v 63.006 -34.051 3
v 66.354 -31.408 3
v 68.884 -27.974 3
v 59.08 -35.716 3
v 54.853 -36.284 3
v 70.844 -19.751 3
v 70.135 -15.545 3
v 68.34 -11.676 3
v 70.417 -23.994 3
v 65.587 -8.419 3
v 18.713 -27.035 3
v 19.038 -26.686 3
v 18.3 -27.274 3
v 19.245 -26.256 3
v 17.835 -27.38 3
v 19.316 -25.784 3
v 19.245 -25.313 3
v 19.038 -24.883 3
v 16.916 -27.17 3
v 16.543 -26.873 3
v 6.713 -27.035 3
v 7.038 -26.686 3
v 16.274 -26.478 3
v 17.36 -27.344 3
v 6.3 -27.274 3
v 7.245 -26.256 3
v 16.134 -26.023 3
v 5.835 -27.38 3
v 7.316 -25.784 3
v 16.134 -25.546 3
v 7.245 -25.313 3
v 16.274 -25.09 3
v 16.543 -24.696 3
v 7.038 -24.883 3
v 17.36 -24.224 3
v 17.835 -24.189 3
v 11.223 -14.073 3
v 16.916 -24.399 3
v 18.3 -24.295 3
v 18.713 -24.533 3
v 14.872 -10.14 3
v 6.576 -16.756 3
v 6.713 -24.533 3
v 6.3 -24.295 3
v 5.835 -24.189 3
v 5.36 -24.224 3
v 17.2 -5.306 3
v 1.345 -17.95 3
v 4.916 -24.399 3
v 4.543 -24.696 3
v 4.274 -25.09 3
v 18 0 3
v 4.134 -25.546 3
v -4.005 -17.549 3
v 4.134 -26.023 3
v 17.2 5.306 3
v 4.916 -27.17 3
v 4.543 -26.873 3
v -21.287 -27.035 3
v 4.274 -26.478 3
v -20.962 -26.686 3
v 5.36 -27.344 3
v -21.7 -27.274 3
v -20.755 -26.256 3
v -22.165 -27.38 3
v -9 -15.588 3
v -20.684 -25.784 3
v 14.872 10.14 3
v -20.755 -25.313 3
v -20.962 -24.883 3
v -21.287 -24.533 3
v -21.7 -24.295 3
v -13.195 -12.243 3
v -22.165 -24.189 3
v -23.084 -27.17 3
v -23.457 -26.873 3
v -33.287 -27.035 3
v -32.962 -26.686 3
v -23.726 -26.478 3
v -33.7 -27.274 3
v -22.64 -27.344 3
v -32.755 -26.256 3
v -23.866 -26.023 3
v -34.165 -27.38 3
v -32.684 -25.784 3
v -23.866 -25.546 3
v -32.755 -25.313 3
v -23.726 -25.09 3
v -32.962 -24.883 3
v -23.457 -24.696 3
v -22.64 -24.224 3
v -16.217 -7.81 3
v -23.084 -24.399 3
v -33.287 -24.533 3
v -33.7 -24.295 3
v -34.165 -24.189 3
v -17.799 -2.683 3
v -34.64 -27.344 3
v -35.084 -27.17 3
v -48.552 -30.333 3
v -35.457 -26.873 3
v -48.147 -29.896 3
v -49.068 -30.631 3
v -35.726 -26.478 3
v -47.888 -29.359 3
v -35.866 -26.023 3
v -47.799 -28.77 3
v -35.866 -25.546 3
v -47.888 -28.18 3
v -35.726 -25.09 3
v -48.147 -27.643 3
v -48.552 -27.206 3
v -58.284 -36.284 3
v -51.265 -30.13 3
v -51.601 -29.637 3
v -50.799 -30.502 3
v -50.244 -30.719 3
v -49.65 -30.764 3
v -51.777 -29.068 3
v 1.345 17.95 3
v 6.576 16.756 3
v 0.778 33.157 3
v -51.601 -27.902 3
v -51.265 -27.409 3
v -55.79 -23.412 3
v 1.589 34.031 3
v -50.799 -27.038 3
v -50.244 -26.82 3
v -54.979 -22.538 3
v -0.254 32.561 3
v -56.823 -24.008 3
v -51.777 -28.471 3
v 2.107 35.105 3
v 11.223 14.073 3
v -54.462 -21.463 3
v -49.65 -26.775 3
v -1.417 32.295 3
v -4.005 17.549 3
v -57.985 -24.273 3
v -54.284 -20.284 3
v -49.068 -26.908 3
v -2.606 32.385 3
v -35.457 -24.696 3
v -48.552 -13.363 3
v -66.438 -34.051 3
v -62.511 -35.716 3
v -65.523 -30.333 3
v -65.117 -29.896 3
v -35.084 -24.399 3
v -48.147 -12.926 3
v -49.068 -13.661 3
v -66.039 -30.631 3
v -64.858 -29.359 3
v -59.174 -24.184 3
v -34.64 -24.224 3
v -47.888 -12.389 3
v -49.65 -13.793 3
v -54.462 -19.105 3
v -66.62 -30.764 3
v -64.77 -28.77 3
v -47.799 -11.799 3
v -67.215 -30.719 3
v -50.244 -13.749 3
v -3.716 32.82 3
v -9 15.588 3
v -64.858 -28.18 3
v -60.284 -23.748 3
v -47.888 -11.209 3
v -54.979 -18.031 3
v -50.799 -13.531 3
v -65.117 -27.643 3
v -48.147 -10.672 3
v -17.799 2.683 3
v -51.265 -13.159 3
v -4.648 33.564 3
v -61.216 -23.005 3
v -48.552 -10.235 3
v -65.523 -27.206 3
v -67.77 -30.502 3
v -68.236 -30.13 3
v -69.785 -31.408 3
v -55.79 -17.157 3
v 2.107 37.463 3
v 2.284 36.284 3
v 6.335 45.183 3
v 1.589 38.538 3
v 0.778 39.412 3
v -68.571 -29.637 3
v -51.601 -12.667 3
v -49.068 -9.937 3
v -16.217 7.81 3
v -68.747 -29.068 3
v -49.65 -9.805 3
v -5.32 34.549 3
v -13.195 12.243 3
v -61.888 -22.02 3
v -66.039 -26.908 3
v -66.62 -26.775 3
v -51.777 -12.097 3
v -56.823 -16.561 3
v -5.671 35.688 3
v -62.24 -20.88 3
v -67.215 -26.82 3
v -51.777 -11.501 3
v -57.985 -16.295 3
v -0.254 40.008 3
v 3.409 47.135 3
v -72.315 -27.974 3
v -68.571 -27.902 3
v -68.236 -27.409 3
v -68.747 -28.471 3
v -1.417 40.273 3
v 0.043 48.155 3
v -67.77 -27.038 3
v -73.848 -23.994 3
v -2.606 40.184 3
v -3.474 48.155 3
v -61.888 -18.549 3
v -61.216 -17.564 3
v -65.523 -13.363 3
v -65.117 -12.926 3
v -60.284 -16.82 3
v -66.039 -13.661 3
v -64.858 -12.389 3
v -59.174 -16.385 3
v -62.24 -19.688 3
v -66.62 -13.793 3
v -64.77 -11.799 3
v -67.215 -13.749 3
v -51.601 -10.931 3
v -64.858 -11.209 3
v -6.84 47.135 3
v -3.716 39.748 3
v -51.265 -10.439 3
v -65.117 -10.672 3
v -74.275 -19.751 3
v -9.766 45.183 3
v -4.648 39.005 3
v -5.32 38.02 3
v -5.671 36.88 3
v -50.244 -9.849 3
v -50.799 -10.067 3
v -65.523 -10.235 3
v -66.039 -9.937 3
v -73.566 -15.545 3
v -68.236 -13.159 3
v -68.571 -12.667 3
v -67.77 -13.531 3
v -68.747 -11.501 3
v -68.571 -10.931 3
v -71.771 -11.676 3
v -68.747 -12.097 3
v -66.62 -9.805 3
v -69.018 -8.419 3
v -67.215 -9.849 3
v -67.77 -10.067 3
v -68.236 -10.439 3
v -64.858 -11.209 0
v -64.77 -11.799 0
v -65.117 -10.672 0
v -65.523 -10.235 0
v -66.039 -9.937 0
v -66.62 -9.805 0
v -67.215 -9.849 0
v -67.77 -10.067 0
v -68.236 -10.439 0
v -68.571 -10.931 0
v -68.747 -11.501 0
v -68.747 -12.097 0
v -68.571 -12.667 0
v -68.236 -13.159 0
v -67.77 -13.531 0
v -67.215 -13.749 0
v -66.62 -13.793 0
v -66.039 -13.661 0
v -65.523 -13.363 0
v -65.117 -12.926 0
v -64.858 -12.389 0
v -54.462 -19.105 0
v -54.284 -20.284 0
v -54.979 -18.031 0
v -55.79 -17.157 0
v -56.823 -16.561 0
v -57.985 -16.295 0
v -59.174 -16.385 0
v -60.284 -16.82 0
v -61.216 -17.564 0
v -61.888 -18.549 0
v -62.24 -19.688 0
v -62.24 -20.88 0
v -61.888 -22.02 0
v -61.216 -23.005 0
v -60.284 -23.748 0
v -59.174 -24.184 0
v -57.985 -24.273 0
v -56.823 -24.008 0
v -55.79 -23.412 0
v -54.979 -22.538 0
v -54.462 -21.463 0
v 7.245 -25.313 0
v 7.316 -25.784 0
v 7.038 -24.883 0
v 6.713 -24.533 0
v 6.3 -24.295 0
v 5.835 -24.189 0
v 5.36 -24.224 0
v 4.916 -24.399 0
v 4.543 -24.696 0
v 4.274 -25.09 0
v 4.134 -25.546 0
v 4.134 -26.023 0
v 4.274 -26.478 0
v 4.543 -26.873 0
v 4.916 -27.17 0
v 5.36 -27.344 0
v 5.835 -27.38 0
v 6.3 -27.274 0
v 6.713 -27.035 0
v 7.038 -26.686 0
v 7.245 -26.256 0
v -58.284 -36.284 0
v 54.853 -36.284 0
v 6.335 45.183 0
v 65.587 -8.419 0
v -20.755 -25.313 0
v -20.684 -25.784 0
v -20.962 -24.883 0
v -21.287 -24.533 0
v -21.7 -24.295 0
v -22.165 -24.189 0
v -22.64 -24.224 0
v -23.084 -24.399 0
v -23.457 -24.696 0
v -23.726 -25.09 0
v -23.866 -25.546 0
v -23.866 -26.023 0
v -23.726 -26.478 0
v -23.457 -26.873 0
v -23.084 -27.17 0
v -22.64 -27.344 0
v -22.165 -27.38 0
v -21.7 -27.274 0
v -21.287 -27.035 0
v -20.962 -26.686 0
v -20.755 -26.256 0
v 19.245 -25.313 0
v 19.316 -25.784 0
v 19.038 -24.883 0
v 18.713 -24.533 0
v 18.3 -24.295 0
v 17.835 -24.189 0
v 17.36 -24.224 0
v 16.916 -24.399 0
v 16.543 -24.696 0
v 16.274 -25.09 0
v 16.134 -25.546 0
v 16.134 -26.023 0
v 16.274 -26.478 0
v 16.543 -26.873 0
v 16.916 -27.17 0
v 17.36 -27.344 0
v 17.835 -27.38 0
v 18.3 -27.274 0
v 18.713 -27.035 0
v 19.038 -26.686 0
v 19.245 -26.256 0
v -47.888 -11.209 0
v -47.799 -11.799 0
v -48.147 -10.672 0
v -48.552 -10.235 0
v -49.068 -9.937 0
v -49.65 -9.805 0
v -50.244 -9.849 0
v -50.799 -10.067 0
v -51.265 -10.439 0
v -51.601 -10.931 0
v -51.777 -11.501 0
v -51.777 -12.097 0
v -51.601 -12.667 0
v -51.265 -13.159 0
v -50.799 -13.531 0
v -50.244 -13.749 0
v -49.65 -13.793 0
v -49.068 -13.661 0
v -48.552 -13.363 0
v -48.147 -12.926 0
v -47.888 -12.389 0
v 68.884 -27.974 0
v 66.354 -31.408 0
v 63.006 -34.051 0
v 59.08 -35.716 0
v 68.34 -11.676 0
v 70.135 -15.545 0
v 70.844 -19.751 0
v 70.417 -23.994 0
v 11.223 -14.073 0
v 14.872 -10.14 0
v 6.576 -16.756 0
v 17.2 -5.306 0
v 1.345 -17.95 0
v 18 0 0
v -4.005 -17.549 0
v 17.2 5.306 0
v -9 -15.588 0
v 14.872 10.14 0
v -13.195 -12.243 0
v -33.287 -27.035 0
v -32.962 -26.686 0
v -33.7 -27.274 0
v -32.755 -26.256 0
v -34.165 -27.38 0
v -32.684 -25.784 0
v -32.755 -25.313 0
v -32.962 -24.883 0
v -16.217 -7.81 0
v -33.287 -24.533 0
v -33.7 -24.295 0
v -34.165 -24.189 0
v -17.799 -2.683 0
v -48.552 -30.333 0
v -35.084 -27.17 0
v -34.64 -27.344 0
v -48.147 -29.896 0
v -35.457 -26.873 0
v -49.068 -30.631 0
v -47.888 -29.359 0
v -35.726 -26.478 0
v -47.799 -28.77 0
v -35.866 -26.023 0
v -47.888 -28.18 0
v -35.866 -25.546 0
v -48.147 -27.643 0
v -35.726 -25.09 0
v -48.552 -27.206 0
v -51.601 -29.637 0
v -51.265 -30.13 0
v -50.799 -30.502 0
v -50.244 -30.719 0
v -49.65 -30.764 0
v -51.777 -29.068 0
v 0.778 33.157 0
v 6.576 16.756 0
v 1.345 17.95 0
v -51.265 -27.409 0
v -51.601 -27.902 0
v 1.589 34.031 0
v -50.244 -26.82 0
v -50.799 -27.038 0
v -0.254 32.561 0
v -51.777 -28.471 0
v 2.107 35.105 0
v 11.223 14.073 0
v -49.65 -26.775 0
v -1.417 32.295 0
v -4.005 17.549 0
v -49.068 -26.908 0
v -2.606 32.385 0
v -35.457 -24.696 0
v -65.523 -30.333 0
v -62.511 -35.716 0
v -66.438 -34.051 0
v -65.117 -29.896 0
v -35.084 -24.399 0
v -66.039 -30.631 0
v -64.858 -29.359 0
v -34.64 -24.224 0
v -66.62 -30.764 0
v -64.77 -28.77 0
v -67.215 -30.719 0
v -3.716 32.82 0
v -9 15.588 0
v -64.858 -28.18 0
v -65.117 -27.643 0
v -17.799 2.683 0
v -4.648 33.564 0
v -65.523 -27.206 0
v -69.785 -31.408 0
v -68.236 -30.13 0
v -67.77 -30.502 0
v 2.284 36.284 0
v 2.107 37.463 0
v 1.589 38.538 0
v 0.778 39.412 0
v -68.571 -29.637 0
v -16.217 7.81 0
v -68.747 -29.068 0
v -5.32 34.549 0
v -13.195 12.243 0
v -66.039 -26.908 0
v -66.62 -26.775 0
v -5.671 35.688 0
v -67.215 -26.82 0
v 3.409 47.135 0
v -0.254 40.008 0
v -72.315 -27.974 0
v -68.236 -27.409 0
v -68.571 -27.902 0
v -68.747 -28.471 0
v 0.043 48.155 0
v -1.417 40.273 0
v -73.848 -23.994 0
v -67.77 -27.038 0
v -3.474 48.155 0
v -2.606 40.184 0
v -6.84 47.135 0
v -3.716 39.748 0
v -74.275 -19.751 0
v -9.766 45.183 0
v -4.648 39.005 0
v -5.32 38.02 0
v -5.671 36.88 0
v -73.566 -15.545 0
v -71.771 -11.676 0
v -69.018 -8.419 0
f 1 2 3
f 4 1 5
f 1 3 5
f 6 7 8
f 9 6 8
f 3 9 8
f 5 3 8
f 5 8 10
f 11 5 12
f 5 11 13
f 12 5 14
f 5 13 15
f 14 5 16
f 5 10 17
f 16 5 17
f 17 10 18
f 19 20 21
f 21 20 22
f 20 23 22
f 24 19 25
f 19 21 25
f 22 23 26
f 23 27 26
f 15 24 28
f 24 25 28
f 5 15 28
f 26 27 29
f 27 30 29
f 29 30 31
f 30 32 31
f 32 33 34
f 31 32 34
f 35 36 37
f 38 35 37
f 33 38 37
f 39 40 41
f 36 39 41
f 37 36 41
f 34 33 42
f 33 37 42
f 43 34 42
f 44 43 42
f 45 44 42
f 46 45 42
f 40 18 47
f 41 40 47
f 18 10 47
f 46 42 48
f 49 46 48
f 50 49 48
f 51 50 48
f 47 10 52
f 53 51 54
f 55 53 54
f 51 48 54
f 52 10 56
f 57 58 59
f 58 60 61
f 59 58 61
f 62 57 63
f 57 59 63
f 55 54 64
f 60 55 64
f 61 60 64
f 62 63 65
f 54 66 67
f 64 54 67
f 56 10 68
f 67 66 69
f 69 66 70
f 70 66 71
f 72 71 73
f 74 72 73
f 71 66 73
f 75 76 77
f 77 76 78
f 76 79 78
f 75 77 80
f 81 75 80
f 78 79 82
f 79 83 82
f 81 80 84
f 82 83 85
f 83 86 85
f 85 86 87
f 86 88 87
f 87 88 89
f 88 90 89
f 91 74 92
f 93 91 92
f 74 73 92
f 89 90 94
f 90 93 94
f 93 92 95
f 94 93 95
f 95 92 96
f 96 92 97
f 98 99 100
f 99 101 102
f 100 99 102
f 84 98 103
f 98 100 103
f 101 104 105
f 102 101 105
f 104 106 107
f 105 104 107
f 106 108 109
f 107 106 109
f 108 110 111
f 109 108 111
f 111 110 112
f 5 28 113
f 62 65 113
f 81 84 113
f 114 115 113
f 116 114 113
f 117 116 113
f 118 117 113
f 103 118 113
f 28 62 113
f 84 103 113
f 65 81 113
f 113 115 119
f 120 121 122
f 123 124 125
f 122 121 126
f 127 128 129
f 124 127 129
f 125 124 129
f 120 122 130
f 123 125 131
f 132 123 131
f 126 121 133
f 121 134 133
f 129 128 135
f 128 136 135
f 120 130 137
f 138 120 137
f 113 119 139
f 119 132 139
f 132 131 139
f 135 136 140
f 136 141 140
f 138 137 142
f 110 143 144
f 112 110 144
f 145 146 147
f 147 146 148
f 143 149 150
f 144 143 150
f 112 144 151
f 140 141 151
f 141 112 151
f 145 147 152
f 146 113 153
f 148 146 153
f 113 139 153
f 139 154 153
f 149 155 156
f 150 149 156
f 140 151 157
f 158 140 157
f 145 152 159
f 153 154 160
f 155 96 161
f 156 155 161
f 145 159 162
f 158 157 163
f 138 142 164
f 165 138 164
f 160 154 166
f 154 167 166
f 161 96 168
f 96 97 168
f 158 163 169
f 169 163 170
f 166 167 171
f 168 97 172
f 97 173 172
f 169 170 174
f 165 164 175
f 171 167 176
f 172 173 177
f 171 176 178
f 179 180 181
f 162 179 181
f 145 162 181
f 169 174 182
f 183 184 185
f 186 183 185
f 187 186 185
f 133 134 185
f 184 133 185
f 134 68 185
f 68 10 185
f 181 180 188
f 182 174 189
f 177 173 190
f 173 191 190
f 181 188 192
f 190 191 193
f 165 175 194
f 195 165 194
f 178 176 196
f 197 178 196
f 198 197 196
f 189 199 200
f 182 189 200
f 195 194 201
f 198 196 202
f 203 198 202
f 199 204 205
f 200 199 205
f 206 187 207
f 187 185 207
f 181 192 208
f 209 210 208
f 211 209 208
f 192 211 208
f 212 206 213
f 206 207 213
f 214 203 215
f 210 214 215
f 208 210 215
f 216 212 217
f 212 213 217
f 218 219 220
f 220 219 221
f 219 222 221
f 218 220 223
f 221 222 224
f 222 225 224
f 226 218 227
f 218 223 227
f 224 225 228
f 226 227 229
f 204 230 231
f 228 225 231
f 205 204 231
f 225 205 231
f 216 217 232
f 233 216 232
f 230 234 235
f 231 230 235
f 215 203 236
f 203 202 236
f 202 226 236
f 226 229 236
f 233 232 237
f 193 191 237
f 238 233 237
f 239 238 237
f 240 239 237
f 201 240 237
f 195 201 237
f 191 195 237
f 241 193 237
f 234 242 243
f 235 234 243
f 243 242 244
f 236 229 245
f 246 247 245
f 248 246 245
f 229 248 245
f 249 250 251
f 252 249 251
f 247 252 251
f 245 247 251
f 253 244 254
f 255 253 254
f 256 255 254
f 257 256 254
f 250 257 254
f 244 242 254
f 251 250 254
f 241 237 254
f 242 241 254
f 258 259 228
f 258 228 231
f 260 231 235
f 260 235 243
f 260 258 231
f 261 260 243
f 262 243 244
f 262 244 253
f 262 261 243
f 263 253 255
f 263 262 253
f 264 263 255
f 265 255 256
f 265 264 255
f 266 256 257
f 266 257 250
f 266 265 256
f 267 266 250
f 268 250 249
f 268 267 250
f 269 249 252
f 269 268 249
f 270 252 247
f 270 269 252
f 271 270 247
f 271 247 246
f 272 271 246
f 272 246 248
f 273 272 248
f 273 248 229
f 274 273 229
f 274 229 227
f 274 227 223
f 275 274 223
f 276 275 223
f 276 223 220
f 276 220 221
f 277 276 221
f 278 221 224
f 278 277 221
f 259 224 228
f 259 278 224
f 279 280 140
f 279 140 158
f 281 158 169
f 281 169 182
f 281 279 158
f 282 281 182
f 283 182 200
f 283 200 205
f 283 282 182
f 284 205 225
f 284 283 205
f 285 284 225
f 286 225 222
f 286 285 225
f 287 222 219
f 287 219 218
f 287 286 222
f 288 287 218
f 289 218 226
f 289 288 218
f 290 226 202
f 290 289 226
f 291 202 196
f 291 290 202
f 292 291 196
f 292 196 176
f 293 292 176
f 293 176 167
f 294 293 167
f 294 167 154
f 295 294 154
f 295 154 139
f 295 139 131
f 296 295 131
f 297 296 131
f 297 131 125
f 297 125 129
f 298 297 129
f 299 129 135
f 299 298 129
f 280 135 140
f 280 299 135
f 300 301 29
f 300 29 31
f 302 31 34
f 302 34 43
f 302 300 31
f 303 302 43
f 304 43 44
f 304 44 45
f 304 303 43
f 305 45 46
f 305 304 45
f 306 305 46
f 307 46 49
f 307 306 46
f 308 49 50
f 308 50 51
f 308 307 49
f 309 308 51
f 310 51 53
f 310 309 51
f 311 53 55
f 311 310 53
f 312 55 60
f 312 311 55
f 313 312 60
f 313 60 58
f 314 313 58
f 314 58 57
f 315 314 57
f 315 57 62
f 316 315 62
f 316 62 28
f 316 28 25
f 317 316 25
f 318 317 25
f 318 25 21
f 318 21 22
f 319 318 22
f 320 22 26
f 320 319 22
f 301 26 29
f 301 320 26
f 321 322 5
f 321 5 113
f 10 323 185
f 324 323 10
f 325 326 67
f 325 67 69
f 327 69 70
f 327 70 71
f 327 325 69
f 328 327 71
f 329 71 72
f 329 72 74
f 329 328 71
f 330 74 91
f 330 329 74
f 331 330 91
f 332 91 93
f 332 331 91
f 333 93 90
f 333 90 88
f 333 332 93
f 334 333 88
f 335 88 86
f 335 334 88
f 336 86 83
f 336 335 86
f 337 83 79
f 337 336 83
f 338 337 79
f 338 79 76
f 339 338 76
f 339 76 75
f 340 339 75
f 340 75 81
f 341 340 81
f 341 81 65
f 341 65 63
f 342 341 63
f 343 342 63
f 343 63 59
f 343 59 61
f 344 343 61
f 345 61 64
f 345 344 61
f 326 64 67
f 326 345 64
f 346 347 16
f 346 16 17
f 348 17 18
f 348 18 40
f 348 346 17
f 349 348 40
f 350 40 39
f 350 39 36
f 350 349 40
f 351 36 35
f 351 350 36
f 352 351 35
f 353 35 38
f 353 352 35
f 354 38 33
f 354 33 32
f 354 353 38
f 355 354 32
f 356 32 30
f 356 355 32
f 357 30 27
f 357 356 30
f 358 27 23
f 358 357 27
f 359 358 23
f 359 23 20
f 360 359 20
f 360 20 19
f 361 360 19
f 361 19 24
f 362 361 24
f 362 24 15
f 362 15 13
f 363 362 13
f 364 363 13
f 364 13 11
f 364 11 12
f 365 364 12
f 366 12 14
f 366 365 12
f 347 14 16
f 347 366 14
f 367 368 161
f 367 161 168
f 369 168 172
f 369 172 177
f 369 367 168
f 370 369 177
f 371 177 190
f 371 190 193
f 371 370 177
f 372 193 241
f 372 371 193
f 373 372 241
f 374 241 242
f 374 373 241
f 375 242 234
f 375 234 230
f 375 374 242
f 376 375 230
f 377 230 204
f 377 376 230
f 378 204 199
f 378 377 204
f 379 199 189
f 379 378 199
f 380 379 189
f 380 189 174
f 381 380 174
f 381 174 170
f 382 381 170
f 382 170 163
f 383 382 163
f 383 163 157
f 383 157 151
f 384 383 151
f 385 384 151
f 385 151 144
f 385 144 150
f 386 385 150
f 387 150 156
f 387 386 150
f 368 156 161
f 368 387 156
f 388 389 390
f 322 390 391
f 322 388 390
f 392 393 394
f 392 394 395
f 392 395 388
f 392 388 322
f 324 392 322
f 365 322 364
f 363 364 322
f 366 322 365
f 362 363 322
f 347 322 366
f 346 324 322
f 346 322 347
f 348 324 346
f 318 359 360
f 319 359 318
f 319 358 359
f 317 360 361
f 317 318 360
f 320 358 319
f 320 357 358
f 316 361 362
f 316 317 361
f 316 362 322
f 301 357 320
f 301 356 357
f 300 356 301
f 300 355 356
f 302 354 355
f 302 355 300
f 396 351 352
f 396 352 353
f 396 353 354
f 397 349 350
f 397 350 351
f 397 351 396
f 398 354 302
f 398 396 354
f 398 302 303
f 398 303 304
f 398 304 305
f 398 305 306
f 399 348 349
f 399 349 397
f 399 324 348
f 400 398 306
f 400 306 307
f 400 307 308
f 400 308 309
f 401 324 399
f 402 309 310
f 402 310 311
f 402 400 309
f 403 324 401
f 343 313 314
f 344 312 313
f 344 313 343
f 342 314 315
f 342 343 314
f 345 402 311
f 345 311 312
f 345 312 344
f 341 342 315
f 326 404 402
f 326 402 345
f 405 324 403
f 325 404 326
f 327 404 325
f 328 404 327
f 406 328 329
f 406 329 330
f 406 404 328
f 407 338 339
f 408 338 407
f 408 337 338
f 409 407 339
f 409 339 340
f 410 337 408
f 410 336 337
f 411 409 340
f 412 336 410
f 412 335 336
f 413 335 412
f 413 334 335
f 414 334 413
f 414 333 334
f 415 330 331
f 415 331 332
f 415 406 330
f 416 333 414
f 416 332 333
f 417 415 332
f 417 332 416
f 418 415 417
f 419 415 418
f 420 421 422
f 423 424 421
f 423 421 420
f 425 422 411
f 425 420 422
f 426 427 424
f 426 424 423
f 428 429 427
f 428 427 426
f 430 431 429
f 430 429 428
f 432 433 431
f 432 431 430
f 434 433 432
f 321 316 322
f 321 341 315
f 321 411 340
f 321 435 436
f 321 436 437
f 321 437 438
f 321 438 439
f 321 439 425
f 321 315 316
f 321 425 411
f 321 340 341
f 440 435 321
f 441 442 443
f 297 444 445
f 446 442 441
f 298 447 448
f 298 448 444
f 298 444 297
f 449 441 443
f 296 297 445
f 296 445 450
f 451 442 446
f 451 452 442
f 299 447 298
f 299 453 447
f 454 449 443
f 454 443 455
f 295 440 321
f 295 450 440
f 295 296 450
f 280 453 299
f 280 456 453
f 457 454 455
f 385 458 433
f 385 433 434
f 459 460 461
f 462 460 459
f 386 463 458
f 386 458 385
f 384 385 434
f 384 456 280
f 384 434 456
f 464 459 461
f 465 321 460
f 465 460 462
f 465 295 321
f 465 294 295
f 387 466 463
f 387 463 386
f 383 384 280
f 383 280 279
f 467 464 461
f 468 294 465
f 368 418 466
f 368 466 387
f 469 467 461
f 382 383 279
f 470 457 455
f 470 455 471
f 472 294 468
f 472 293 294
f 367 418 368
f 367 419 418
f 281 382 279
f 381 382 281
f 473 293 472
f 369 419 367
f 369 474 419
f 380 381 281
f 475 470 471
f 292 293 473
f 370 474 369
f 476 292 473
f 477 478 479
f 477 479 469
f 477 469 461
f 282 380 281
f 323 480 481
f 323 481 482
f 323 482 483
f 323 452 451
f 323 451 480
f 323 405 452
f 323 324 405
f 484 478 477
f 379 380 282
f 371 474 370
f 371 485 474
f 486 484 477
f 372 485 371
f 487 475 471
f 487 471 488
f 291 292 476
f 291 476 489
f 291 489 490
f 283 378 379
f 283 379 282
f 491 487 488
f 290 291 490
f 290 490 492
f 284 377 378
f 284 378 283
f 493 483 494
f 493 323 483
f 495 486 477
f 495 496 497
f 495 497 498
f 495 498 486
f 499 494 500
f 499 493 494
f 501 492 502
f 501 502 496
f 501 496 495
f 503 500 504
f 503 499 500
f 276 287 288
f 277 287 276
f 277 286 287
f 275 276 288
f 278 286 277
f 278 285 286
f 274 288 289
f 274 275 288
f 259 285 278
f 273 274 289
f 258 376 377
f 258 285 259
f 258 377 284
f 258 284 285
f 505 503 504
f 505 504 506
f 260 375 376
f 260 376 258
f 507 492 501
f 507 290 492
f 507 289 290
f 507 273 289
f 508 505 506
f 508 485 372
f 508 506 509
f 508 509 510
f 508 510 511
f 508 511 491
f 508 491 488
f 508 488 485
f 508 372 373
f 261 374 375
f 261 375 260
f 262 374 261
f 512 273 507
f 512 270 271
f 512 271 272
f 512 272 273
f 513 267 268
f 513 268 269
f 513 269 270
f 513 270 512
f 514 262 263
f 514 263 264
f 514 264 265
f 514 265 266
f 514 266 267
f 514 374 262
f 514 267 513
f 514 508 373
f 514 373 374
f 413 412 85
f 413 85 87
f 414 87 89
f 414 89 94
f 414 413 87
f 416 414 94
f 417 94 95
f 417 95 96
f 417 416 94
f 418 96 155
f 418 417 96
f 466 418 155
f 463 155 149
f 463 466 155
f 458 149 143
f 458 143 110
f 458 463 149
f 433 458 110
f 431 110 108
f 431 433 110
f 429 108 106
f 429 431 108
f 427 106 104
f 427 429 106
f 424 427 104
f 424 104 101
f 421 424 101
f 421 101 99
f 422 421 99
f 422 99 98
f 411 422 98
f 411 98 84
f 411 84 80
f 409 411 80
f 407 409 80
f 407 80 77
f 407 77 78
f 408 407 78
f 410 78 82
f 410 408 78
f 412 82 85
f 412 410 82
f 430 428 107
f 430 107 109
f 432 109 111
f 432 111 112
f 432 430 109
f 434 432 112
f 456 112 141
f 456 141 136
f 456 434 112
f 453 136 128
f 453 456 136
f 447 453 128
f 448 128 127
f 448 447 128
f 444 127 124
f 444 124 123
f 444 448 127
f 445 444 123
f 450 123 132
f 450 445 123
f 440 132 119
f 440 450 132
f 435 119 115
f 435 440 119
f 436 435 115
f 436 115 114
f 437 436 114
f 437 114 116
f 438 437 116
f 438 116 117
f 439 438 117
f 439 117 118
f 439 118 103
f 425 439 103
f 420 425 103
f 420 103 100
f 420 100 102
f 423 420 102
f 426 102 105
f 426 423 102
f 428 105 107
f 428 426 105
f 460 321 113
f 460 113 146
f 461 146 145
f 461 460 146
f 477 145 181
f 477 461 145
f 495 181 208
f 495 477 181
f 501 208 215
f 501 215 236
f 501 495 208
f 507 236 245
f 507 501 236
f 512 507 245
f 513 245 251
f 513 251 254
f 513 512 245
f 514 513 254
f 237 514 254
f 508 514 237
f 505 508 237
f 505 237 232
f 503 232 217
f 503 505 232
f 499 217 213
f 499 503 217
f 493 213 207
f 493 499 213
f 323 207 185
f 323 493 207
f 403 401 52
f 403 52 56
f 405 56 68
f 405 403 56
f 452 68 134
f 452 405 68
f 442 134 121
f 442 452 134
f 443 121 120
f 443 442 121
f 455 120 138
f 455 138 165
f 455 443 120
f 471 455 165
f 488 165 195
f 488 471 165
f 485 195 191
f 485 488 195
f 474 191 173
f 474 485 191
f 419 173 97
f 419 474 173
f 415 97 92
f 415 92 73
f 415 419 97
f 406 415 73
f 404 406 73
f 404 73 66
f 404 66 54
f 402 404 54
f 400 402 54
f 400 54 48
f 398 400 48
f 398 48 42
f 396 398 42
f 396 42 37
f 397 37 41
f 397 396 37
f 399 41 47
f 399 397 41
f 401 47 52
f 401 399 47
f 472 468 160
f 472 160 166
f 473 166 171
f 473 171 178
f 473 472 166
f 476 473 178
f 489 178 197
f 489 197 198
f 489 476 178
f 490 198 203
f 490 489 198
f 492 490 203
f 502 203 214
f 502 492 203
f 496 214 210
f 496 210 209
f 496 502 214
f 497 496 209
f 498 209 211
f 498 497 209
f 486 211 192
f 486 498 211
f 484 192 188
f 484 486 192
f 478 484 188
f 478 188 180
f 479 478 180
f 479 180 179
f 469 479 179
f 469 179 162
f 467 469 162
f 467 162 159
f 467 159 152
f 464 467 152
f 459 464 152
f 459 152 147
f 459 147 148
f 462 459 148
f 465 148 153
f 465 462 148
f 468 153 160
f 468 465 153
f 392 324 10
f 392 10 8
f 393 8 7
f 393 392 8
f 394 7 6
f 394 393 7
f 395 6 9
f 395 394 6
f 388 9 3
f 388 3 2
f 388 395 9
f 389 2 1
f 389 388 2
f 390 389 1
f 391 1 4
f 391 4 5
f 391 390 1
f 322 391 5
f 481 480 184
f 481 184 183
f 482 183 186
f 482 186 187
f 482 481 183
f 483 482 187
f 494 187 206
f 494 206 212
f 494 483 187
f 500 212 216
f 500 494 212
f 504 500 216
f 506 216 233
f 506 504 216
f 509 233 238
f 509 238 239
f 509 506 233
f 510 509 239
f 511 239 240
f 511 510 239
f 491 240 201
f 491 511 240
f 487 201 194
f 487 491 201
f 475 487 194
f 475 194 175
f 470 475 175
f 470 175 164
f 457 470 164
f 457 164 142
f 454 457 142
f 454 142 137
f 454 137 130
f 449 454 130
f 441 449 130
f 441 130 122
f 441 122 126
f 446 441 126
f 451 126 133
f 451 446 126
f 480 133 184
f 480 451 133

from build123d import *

# Parameters (mm, degrees)
MODEL_R         = 1.6
MODEL_R_2       = 18
MODEL_R_3       = 4
MODEL_R_4       = 2
EXTRUDE_1_DEPTH = 3


with BuildPart() as part:
    # Model → 凸台-拉伸1 (new body)
    with BuildSketch(Plane.XY):
        with BuildLine():
            Line((-69.018143336, -8.419028309), (-9.766132819, 45.183203451))
            ThreePointArc((-9.766132819, 45.183203451), (-1.715728752, 48.284271248), (6.334675314, 45.183203451))
            Line((6.334675314, 45.183203451), (65.586685831, -8.419028309))
            ThreePointArc((65.586685831, -8.419028309), (69.783384512, -26.035623827), (54.852813742, -36.284271247))
            Line((54.852813742, -36.284271247), (-58.284271247, -36.284271247))
            ThreePointArc((-58.284271247, -36.284271247), (-73.214842017, -26.035623827), (-69.018143336, -8.419028309))
        make_face()
        with Locations((5.715728753, -25.784271247)):
            Circle(MODEL_R, mode=Mode.SUBTRACT)
        Circle(MODEL_R_2, mode=Mode.SUBTRACT)
        with Locations((-58.284271248, -20.284271247)):
            Circle(MODEL_R_3, mode=Mode.SUBTRACT)
        with Locations((-1.715728753, 36.284271247)):
            Circle(MODEL_R_3, mode=Mode.SUBTRACT)
        with Locations((-22.284271247, -25.784271247)):
            Circle(MODEL_R, mode=Mode.SUBTRACT)
        with Locations((-34.284271247, -25.784271247)):
            Circle(MODEL_R, mode=Mode.SUBTRACT)
        with Locations((17.715728753, -25.784271247)):
            Circle(MODEL_R, mode=Mode.SUBTRACT)
        with Locations((-66.769552622, -11.798989873)):
            Circle(MODEL_R_4, mode=Mode.SUBTRACT)
        with Locations((-49.798989873, -11.798989873)):
            Circle(MODEL_R_4, mode=Mode.SUBTRACT)
        with Locations((-49.798989873, -28.769552622)):
            Circle(MODEL_R_4, mode=Mode.SUBTRACT)
        with Locations((-66.769552622, -28.769552622)):
            Circle(MODEL_R_4, mode=Mode.SUBTRACT)
    extrude(amount=EXTRUDE_1_DEPTH)


solid = part.part
